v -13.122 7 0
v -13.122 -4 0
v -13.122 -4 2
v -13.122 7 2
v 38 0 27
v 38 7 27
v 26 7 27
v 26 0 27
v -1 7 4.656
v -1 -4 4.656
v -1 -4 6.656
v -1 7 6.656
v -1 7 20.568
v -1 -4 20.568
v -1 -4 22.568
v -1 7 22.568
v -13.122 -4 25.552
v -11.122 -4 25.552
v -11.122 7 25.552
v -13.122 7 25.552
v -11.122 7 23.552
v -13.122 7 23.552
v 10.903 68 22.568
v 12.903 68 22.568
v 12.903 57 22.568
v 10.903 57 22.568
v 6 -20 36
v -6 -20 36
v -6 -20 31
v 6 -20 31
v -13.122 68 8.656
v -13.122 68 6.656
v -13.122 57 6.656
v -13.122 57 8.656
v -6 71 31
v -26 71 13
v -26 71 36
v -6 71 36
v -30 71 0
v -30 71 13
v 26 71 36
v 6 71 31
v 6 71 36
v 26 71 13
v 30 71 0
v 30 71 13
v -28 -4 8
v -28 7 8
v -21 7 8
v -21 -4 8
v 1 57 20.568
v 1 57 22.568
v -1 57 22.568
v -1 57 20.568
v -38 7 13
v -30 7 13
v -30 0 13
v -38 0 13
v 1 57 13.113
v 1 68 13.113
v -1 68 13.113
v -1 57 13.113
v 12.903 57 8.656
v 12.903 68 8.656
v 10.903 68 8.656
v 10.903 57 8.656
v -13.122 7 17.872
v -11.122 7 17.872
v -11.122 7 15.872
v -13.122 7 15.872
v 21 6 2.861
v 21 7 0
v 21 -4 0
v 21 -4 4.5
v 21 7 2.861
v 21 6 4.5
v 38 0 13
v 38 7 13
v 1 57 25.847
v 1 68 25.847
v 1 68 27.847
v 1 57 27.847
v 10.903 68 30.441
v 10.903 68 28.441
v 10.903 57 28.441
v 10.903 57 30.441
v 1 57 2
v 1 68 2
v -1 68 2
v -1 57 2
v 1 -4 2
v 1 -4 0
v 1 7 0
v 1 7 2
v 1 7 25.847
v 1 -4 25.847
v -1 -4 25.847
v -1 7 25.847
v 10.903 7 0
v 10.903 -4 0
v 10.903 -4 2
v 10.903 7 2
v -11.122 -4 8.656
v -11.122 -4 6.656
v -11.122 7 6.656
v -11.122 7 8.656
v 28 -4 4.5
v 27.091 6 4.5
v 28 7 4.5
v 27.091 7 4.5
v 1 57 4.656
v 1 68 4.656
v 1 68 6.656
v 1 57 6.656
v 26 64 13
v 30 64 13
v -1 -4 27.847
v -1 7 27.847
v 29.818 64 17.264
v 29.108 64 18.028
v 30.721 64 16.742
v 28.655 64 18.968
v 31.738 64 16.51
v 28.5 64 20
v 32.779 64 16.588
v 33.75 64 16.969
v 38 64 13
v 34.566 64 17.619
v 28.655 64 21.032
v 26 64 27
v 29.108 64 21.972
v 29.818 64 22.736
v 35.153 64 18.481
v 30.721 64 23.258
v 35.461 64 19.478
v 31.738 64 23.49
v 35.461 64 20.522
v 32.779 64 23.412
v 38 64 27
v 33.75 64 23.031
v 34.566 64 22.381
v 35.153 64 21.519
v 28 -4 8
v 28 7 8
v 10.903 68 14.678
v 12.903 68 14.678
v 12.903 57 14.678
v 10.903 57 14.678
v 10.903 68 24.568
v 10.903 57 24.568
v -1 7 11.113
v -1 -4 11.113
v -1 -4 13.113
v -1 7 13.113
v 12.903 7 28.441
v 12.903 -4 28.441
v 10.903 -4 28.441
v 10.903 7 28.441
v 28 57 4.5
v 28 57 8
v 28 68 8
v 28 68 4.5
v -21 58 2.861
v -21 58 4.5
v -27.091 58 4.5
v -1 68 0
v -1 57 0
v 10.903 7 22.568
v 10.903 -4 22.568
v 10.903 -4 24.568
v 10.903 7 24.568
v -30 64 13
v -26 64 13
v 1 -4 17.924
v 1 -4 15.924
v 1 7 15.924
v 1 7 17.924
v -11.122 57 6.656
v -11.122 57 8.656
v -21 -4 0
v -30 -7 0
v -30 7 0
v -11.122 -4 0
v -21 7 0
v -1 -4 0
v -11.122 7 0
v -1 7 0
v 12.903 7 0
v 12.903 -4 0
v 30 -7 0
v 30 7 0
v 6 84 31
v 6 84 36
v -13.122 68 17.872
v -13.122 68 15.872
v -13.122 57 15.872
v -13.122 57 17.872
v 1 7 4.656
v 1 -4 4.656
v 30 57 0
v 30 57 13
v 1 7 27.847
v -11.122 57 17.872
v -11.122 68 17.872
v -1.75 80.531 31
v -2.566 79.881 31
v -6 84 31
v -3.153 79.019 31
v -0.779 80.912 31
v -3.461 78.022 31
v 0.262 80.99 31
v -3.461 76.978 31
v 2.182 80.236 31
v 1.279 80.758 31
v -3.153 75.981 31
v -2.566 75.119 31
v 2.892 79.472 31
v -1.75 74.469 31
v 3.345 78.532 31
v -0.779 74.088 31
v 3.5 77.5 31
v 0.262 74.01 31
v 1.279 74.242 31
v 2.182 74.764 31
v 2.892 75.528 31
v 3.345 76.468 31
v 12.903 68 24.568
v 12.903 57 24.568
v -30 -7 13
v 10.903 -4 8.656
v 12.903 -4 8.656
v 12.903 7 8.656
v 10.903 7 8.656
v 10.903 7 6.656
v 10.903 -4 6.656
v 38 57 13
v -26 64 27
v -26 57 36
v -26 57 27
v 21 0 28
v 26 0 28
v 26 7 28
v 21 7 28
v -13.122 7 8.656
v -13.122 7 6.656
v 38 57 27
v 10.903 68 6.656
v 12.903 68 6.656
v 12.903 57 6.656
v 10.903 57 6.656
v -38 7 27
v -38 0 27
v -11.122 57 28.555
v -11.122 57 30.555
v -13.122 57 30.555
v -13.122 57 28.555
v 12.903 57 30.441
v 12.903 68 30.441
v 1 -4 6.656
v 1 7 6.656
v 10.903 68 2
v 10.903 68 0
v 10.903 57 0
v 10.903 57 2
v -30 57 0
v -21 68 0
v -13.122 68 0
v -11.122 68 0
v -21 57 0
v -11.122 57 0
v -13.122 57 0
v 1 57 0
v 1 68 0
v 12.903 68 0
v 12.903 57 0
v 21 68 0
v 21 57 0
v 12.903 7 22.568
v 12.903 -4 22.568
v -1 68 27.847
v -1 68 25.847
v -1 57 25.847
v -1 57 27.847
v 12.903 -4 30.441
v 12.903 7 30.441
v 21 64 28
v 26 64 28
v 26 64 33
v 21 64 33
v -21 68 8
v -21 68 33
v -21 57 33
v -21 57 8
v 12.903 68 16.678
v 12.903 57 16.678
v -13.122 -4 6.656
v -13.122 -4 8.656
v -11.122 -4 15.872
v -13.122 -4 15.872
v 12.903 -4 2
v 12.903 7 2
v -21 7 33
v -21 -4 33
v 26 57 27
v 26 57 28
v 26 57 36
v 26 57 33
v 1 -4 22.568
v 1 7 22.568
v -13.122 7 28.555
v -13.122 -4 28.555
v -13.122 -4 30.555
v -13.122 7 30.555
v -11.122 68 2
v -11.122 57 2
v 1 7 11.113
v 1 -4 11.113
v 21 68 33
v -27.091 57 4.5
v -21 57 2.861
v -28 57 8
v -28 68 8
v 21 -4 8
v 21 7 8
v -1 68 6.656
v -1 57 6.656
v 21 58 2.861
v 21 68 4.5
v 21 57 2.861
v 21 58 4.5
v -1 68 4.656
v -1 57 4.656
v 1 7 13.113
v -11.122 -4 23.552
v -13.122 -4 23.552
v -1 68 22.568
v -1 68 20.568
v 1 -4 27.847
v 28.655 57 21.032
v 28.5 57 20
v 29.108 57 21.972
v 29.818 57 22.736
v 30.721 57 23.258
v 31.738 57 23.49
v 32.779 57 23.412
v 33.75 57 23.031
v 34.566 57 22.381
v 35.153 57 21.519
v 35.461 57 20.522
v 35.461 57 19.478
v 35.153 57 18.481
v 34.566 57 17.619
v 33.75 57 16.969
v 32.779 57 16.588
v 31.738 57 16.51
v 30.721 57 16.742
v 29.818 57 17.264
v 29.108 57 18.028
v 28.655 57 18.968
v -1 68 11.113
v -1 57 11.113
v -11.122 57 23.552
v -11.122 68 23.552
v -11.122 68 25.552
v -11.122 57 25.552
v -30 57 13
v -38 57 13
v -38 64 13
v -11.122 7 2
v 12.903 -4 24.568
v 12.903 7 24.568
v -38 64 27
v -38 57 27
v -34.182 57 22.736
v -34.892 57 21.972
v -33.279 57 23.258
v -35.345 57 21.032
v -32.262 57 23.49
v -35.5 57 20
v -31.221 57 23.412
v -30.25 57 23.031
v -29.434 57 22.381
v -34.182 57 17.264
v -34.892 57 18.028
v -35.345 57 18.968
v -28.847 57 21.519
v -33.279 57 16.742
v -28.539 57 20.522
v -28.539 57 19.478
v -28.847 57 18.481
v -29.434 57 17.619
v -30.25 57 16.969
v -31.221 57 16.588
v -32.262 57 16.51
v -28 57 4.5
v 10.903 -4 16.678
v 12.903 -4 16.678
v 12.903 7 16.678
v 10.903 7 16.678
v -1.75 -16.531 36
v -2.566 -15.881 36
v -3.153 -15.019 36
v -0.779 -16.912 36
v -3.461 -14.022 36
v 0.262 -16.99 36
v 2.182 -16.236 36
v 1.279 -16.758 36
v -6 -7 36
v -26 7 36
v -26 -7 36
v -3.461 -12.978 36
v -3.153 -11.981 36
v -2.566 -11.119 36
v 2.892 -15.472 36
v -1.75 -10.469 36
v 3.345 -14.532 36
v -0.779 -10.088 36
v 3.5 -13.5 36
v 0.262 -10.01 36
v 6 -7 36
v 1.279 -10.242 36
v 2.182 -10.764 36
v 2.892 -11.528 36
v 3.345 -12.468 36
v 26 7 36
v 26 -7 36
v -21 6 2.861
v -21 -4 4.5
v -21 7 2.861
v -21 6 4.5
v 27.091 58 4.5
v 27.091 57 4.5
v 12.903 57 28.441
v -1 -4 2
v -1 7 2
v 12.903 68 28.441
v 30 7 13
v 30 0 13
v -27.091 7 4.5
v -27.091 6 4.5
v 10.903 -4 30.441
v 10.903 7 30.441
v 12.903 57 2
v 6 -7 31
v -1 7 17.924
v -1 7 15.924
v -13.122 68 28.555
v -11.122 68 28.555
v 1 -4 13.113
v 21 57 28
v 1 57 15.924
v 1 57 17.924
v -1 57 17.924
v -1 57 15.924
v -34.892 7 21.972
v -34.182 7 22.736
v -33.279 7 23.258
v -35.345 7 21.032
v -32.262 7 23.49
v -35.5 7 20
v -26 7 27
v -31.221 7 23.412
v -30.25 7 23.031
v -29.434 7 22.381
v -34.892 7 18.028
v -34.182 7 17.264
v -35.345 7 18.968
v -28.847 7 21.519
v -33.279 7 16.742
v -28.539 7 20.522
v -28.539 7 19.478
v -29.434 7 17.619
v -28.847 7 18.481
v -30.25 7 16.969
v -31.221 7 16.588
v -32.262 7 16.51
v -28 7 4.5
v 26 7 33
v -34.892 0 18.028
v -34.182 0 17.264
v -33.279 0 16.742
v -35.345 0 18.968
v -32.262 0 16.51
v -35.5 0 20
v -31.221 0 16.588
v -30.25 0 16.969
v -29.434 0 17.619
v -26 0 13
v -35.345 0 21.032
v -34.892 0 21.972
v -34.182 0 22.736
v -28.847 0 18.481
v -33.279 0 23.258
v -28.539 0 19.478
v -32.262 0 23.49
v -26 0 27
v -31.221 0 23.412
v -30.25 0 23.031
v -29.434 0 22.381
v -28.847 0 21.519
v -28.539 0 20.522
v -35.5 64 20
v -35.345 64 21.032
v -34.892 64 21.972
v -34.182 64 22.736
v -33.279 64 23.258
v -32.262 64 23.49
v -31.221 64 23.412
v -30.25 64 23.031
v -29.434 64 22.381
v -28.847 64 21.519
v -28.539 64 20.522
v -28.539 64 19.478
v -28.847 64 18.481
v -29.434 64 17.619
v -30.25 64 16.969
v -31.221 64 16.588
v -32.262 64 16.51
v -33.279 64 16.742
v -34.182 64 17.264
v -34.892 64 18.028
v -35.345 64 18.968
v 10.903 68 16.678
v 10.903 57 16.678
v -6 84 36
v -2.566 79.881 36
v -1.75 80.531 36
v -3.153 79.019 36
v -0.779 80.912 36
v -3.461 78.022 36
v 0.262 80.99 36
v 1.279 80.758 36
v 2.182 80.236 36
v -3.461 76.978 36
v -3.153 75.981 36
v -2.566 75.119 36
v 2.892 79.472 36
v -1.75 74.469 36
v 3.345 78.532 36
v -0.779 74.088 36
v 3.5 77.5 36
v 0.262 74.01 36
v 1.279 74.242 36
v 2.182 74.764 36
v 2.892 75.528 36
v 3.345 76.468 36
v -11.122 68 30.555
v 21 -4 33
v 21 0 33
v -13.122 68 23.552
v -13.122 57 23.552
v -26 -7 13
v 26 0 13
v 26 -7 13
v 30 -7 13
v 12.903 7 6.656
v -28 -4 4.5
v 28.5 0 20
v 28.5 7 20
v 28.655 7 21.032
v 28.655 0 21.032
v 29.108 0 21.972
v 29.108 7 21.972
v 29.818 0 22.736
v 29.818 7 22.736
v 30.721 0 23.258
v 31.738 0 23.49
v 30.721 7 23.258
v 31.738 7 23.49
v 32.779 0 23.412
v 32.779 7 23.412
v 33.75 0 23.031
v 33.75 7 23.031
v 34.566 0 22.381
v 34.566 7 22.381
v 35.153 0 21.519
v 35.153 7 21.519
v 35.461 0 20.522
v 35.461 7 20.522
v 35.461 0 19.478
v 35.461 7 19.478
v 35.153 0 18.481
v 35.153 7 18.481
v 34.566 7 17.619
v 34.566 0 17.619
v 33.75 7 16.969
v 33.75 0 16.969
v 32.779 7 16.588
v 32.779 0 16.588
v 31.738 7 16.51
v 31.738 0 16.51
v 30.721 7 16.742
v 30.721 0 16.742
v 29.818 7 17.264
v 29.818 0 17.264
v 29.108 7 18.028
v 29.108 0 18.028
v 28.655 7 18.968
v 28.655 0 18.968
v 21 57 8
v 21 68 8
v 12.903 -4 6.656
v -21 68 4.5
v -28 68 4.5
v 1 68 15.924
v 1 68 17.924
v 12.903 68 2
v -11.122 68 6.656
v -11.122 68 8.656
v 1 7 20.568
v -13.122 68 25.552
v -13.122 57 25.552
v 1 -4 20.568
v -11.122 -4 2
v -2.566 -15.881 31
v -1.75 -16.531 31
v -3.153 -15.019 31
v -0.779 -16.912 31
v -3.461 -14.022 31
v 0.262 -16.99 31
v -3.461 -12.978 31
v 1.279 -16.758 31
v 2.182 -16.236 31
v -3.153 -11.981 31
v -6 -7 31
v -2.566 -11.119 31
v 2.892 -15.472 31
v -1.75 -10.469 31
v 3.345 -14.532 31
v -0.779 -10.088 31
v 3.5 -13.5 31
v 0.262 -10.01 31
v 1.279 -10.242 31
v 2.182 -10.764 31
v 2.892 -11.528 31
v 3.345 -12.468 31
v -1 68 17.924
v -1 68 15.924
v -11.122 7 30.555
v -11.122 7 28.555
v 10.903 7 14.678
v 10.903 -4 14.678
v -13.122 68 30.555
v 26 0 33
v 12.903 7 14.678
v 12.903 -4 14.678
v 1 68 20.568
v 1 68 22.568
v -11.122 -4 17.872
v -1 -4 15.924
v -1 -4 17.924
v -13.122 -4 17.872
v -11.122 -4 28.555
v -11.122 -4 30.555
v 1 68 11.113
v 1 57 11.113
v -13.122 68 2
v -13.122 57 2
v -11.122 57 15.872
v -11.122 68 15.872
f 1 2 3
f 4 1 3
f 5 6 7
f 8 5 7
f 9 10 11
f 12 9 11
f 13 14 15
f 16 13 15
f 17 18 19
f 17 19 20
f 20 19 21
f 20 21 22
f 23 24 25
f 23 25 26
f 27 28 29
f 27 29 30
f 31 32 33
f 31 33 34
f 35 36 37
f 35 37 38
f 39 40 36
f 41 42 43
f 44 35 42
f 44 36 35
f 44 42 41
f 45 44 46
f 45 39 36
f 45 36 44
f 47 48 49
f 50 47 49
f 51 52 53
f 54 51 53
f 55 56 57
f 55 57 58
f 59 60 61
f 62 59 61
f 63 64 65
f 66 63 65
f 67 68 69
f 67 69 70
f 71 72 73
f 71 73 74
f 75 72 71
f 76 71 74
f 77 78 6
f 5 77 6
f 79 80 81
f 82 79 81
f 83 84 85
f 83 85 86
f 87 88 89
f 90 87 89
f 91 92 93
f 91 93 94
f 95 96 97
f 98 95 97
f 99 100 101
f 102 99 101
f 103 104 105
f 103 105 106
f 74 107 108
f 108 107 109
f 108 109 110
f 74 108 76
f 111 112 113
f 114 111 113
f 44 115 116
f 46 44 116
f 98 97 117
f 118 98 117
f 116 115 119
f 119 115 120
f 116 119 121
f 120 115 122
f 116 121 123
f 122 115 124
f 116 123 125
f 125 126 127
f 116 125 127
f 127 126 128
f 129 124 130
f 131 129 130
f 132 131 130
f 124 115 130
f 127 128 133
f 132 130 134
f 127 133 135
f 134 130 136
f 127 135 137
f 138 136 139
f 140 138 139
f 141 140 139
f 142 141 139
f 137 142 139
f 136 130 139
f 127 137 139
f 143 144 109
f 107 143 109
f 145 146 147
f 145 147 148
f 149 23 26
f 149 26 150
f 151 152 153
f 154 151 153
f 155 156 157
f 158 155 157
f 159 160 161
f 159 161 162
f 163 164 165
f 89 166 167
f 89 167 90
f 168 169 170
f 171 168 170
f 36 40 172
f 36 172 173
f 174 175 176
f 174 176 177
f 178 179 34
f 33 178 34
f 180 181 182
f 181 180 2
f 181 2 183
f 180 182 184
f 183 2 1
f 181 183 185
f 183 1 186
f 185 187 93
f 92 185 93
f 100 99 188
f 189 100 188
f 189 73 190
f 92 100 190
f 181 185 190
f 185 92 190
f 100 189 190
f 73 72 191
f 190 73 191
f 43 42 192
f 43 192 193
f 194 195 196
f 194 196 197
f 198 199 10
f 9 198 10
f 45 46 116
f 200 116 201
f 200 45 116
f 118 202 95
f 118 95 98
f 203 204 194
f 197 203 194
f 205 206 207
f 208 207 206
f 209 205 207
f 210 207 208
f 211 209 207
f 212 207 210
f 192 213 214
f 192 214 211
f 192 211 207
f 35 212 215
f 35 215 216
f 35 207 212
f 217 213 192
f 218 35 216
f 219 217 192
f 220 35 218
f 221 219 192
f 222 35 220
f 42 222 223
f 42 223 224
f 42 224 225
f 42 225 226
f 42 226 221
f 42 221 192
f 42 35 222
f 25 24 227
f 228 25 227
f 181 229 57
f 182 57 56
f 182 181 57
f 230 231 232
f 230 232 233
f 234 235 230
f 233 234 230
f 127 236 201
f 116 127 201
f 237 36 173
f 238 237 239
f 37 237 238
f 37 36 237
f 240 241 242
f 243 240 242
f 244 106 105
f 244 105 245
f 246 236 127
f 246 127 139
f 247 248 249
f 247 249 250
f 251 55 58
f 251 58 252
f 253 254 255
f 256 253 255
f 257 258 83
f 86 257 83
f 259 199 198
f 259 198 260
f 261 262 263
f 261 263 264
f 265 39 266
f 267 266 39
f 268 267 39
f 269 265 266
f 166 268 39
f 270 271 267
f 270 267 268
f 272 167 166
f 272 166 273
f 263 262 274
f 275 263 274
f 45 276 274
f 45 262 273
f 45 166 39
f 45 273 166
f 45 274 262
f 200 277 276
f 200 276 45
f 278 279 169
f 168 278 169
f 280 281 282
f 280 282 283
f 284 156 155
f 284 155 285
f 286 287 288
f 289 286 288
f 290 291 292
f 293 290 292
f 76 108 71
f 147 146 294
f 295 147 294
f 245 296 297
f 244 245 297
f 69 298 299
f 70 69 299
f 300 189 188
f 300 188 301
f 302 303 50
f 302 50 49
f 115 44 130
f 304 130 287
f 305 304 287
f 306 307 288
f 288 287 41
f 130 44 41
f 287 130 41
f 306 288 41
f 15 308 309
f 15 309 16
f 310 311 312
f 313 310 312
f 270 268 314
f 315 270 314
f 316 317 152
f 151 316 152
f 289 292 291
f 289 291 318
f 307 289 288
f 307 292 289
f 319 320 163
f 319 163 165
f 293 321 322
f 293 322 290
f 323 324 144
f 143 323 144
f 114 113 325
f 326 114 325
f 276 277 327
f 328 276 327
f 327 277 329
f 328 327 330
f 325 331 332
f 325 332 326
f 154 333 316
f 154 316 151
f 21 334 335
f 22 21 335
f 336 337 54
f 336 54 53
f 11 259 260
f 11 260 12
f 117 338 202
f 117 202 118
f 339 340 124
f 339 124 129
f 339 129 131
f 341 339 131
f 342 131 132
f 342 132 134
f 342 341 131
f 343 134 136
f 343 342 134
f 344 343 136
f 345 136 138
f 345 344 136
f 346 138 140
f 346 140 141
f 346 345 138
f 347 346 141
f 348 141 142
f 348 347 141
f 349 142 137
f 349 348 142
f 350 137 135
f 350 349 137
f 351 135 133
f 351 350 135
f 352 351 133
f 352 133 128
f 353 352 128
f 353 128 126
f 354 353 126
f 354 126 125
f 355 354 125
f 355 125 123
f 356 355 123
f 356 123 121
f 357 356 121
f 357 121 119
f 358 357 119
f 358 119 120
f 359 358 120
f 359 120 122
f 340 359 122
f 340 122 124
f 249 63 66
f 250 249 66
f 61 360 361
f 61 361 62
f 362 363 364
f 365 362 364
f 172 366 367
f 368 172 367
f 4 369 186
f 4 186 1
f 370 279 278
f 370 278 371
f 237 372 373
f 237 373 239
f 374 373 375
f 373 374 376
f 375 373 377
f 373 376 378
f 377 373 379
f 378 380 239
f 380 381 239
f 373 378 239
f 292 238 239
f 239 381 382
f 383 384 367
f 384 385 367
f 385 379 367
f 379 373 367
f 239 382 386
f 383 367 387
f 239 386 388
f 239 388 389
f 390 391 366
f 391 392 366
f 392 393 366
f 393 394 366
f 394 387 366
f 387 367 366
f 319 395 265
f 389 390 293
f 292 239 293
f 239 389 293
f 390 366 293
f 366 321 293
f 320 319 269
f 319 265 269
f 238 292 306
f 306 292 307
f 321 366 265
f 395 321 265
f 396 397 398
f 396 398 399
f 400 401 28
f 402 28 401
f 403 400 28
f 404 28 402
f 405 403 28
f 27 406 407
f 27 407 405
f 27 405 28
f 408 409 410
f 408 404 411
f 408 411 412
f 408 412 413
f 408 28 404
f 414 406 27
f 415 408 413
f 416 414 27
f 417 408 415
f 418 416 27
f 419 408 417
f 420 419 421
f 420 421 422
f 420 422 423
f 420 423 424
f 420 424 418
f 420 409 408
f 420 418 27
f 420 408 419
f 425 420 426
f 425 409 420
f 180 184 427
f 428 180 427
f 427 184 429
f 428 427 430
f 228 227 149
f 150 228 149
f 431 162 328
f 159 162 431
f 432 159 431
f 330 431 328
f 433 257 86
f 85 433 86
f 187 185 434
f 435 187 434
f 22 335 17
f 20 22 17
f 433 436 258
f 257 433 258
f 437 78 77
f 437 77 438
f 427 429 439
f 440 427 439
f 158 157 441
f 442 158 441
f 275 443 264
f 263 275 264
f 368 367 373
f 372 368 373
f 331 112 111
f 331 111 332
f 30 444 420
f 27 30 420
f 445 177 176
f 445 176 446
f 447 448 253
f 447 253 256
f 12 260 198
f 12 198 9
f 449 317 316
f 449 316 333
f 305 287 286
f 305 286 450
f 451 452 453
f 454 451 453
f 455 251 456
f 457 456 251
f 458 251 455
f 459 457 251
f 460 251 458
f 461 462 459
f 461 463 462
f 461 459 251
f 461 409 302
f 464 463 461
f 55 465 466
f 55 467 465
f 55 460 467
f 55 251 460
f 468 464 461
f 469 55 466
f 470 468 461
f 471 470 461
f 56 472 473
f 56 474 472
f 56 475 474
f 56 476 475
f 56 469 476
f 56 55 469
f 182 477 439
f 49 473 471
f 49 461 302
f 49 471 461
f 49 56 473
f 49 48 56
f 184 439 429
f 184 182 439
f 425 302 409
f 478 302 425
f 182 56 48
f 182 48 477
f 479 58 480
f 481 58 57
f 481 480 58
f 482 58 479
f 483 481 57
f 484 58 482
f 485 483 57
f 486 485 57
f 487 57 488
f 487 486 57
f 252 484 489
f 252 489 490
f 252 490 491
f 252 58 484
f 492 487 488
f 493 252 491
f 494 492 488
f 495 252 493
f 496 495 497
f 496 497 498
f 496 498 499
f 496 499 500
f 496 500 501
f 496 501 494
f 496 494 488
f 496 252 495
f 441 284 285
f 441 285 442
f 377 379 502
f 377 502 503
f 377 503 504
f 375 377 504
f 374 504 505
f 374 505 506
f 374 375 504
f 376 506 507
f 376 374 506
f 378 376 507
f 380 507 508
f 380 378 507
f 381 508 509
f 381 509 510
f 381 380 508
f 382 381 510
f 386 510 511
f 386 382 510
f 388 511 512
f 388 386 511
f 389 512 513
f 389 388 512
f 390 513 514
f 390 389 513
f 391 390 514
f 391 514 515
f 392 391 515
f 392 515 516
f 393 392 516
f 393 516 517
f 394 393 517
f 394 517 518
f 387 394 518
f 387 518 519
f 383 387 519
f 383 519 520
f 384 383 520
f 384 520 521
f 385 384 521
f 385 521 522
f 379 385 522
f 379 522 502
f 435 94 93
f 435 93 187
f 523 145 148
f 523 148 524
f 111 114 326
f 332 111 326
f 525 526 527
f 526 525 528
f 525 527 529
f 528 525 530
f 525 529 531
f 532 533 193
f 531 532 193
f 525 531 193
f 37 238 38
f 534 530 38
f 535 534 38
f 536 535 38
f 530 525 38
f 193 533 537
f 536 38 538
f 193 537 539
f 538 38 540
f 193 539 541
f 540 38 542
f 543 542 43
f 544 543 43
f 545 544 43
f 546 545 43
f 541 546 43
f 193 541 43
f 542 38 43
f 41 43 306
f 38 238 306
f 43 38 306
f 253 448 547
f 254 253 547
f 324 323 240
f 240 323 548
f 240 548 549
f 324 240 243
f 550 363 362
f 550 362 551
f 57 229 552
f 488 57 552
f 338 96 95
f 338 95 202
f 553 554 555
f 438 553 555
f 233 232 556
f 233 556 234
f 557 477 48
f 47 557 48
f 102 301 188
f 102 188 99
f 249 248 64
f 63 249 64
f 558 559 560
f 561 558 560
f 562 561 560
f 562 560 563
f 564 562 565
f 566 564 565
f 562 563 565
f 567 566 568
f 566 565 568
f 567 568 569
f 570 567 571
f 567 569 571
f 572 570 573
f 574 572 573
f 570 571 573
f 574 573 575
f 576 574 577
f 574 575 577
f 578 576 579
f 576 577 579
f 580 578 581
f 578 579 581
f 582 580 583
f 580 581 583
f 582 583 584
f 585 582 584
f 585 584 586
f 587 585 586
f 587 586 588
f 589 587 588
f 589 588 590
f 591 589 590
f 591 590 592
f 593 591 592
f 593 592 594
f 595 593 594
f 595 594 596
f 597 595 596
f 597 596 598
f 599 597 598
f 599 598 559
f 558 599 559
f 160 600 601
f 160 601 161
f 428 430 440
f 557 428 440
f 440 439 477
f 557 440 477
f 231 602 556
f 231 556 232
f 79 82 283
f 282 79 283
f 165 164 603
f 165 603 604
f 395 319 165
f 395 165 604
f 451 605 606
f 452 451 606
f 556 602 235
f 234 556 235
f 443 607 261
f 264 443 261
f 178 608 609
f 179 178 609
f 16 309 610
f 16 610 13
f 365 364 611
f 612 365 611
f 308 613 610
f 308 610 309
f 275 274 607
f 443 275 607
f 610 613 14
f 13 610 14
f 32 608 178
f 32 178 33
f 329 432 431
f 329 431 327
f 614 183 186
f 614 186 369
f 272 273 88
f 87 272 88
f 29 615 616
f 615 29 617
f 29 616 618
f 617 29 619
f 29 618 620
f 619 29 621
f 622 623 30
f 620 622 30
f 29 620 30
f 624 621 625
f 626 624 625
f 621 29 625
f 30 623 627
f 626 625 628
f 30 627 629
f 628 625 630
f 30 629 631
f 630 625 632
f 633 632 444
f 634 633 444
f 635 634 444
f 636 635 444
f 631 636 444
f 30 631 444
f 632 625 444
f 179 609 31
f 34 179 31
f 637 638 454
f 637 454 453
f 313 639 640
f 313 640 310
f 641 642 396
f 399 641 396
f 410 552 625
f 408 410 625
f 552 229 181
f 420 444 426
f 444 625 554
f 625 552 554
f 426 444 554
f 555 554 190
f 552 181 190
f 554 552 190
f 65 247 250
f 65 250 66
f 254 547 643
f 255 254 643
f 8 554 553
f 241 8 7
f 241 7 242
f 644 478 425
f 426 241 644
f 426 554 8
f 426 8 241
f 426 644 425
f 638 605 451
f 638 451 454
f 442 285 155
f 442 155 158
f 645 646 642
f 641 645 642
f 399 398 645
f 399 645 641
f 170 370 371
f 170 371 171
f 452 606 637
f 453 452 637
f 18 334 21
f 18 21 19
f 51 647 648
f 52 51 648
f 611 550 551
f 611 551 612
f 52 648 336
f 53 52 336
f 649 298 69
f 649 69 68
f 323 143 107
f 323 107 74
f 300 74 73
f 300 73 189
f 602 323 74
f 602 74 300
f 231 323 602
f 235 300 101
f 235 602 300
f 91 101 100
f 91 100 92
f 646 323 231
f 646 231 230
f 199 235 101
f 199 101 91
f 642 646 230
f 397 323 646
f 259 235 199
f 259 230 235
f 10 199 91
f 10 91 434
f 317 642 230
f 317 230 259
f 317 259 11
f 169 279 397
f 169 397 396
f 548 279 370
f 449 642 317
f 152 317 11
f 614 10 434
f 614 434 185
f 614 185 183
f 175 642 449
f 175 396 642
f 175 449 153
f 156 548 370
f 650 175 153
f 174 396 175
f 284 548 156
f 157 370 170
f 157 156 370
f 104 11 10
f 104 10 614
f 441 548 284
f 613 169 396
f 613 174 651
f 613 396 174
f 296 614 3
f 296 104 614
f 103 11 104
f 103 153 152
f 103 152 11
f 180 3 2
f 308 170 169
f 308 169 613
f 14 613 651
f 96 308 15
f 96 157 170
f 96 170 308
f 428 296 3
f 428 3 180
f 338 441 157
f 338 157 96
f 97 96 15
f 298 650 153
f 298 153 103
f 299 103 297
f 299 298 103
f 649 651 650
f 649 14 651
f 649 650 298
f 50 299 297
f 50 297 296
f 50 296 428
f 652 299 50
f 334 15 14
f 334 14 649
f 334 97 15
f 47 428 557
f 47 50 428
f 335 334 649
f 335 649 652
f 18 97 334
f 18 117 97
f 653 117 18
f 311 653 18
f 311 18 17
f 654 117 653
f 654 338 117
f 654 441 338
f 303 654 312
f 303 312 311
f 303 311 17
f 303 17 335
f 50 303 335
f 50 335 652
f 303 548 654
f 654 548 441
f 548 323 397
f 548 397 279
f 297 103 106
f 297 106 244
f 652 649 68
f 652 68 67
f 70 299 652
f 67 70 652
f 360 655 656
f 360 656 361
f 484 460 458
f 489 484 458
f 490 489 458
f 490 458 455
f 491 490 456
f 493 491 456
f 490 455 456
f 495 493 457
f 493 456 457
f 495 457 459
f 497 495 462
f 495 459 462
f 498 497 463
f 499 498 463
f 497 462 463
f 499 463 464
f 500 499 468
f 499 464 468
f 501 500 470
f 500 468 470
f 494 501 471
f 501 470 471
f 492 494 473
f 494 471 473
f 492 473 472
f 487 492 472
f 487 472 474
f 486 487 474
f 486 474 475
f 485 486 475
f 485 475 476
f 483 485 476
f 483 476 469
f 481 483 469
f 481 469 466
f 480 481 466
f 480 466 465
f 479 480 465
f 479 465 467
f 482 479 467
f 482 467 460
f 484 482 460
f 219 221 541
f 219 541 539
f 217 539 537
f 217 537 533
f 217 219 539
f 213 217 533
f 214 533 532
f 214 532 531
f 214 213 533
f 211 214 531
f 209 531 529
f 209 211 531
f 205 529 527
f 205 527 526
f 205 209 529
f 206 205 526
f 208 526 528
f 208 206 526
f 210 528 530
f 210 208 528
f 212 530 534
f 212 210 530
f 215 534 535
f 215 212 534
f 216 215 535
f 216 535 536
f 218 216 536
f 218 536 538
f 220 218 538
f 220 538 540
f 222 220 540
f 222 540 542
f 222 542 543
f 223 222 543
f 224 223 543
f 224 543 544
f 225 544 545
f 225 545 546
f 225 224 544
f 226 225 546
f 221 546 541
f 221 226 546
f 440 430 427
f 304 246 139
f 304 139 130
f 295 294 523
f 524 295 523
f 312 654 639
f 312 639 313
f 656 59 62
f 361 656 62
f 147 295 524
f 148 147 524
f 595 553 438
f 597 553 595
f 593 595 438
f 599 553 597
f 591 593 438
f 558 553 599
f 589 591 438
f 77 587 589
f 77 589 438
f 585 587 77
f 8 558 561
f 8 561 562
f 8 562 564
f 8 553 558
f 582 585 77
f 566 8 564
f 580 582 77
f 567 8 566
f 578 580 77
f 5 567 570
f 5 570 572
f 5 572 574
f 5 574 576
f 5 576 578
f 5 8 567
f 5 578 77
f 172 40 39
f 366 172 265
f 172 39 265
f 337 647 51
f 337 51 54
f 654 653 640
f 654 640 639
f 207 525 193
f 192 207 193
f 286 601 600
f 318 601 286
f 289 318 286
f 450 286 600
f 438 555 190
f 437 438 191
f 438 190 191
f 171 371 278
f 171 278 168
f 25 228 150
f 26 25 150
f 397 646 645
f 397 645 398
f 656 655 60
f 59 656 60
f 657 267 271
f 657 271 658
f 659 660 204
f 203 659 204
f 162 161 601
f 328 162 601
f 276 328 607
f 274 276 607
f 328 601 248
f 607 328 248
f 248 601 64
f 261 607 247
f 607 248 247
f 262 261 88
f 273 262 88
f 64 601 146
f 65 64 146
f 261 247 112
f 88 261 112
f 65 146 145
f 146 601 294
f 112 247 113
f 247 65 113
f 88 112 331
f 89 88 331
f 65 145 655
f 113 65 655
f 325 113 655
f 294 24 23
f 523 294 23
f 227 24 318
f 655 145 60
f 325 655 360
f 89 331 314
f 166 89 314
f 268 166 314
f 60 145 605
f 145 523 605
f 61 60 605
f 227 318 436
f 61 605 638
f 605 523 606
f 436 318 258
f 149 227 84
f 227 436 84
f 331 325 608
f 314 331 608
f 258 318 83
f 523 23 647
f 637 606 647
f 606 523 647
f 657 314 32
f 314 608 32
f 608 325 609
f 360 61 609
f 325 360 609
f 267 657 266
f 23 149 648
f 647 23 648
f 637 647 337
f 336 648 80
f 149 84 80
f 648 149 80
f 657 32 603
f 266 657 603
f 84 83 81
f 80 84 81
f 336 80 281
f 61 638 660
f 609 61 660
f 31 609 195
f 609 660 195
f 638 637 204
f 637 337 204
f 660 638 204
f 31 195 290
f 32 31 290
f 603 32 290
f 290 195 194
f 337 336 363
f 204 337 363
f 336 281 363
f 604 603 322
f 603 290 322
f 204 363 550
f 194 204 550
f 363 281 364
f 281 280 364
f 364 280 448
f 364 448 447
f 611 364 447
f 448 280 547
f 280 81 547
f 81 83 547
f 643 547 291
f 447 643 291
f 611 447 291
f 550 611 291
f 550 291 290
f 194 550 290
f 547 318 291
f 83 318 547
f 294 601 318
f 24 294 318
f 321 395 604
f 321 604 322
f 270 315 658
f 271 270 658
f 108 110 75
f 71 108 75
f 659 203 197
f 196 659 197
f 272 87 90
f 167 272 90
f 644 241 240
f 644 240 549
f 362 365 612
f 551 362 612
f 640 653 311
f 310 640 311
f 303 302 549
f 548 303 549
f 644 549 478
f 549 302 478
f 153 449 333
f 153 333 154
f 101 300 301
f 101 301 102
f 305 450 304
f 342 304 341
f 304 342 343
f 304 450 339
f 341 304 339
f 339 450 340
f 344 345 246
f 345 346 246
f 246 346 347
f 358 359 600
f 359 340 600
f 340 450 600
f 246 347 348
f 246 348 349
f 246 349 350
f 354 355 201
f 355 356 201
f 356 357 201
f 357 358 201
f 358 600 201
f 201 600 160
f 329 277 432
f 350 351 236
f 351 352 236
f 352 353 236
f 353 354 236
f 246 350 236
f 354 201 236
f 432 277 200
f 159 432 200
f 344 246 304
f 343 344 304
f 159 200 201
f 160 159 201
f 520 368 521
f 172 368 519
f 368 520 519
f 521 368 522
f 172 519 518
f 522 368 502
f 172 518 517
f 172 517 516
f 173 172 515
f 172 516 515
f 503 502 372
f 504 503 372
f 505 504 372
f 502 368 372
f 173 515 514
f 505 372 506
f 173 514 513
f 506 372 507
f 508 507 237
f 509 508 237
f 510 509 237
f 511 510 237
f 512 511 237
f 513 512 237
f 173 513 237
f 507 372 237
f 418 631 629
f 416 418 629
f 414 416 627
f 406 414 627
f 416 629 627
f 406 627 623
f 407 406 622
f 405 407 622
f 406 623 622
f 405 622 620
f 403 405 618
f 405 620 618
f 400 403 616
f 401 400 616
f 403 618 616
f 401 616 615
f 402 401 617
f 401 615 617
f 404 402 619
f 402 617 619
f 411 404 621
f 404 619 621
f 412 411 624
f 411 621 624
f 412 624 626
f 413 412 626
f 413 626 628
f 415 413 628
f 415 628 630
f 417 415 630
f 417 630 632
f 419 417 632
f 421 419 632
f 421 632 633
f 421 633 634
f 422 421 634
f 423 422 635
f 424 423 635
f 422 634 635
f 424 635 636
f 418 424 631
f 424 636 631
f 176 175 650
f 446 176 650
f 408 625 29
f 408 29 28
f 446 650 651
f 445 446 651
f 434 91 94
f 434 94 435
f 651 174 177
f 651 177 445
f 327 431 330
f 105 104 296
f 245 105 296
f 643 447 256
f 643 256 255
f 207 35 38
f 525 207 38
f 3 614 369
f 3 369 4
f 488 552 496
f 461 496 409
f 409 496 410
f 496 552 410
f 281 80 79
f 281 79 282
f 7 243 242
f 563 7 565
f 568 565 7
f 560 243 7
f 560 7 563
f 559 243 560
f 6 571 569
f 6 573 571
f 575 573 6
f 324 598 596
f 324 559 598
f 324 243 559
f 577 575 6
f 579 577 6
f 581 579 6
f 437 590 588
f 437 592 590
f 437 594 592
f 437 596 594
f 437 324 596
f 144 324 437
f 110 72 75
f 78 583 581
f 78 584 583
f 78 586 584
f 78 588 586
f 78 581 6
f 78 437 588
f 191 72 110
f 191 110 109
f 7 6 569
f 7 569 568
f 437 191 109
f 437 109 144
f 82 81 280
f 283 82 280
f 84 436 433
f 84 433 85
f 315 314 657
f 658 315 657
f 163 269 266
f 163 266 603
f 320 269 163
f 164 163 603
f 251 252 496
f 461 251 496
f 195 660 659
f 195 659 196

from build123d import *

# Parameters (mm, degrees)
F0_W      = 60
F0_H      = 14
F1_DEPTH  = 36
F3_W      = 42
F3_H      = 11
F4_DEPTH  = 25
F5_W      = 42
F5_H      = 4.5
F6_DEPTH  = 11
F7_W      = 8
F7_H      = 14
F8_DEPTH  = 14
F9_R      = 3.5
F10_DEPTH = 14
F11_W     = 12
F11_H     = 14
F12_DEPTH = 7
F13_W     = 4
F13_H     = 9
F14_DEPTH = 14
F15_W     = 7
F15_H     = 5
F16_DEPTH = 5
F18_DEPTH = 1
F19_W     = 12
F19_H     = 5
F20_DEPTH = 13
F21_R     = 3.5
F22_DEPTH = 5
F25_W     = 2
F25_H     = 2
F26_DEPTH = 11


with BuildPart() as f1:
    # F0 (on Top) → F1 (new body)
    with BuildSketch(Plane.XY):
        Rectangle(F0_W, F0_H)
    extrude(amount=F1_DEPTH)

    # F3 (on offset) → F4 (cut)
    with BuildSketch(Plane.XY.offset(33)):
        with Locations((0, 1.5)):
            Rectangle(F3_W, F3_H)
    extrude(amount=-F4_DEPTH, mode=Mode.SUBTRACT)

    # F5 (on face) → F6 (cut)
    with BuildSketch(Plane(origin=(0, 7, 0), x_dir=(-1, 0, 0), z_dir=(0, 1, 0))):
        Polygon((21, 4.5), (28, 4.5), (28, 8), (-28, 8), (-28, 4.5), (-21, 4.5), align=None)
        with Locations((0, 2.25)):
            Rectangle(F5_W, F5_H)
    extrude(amount=-F6_DEPTH, mode=Mode.SUBTRACT)

    # F7 (on face) → F8 (join)
    with BuildSketch(Plane(origin=(0, 7, 0), x_dir=(-1, 0, 0), z_dir=(0, 1, 0))):
        with Locations((34, 20)):
            Rectangle(F7_W, F7_H)
        with Locations((-34, 20)):
            Rectangle(F7_W, F7_H)
    extrude(amount=-F8_DEPTH)

    # F9 (on face) → F10 (cut)
    with BuildSketch(Plane(origin=(0, 7, 0), x_dir=(-1, 0, 0), z_dir=(0, 1, 0))):
        with Locations((32, 20)):
            Circle(F9_R)
        with Locations((-32, 20)):
            Circle(F9_R)
    extrude(amount=-F10_DEPTH, mode=Mode.SUBTRACT)

    # F11 (on face) → F12 (cut)
    with BuildSketch(Plane.XZ.offset(7)):
        with Locations((32, 20)):
            Rectangle(F11_W, F11_H)
        with Locations((-32, 20)):
            Rectangle(F11_W, F11_H)
    extrude(amount=-F12_DEPTH, mode=Mode.SUBTRACT)

    # F13 (on face) → F14 (cut)
    with BuildSketch(Plane.XZ.offset(7)):
        with Locations((28, 31.5)):
            Rectangle(F13_W, F13_H)
        with Locations((-28, 31.5)):
            Rectangle(F13_W, F13_H)
    extrude(amount=-F14_DEPTH, mode=Mode.SUBTRACT)

    # F15 (on face) → F16 (cut)
    with BuildSketch(Plane.YZ.offset(26)):
        with Locations((3.5, 30.5)):
            Rectangle(F15_W, F15_H)
    extrude(amount=-F16_DEPTH, mode=Mode.SUBTRACT)

    # F17 (on face) → F18 (cut)
    with BuildSketch(Plane(origin=(0, 7, 0), x_dir=(-1, 0, 0), z_dir=(0, 1, 0))):
        Polygon((-27.090767, 4.5), (-21, 2.861343), (-21, 4.5), align=None)
        Polygon((21, 4.5), (21, 2.861343), (27.090767, 4.5), align=None)
    extrude(amount=-F18_DEPTH, mode=Mode.SUBTRACT)

    # F19 (on face) → F20 (join)
    with BuildSketch(Plane.XZ.offset(7)):
        with Locations((0, 33.5)):
            Rectangle(F19_W, F19_H)
    extrude(amount=F20_DEPTH)

    # F21 (on face) → F22 (cut)
    with BuildSketch(Plane(origin=(0, 0, 31), x_dir=(1, 0, 0), z_dir=(0, 0, -1))):
        with Locations((0, 13.5)):
            Circle(F21_R)
    extrude(amount=-F22_DEPTH, mode=Mode.SUBTRACT)

    # F25 (on face) → F26 (join)
    with BuildSketch(Plane(origin=(0, -4, 0), x_dir=(-1, 0, 0), z_dir=(0, 1, 0))):
        with Locations((0, 1)):
            Rectangle(F25_W, F25_H)
        with Locations((0, 5.655716)):
            Rectangle(F25_W, F25_H)
        with Locations((0, 12.112861)):
            Rectangle(F25_W, F25_H)
        with Locations((0, 16.924154)):
            Rectangle(F25_W, F25_H)
        with Locations((0, 21.568386)):
            Rectangle(F25_W, F25_H)
        with Locations((0, 26.847442)):
            Rectangle(F25_W, F25_H)
        with Locations((12.122143, 1)):
            Rectangle(F25_W, F25_H)
        with Locations((12.122143, 7.655716)):
            Rectangle(F25_W, F25_H)
        with Locations((12.122143, 16.872294)):
            Rectangle(F25_W, F25_H)
        with Locations((12.122143, 24.552066)):
            Rectangle(F25_W, F25_H)
        with Locations((12.122143, 29.55527)):
            Rectangle(F25_W, F25_H)
        with Locations((-11.902618, 1)):
            Rectangle(F25_W, F25_H)
        with Locations((-11.902618, 7.655716)):
            Rectangle(F25_W, F25_H)
        with Locations((-11.902618, 15.678002)):
            Rectangle(F25_W, F25_H)
        with Locations((-11.902618, 23.568386)):
            Rectangle(F25_W, F25_H)
        with Locations((-11.902618, 29.441275)):
            Rectangle(F25_W, F25_H)
    extrude(amount=F26_DEPTH)


with BuildPart() as f24_1:
    # F24: instance of F1
    add(f1.part.mirror(Plane(origin=(-18.525055, 32, 22.958513), x_dir=(-1, 0, 0), z_dir=(0, 1, 0))))

    # F27: F1 across plane
    add(f1.part.mirror(Plane(origin=(-18.525055, 32, 22.958513), x_dir=(-1, 0, 0), z_dir=(0, 1, 0))))


solid = Compound([f1.part, f24_1.part])
